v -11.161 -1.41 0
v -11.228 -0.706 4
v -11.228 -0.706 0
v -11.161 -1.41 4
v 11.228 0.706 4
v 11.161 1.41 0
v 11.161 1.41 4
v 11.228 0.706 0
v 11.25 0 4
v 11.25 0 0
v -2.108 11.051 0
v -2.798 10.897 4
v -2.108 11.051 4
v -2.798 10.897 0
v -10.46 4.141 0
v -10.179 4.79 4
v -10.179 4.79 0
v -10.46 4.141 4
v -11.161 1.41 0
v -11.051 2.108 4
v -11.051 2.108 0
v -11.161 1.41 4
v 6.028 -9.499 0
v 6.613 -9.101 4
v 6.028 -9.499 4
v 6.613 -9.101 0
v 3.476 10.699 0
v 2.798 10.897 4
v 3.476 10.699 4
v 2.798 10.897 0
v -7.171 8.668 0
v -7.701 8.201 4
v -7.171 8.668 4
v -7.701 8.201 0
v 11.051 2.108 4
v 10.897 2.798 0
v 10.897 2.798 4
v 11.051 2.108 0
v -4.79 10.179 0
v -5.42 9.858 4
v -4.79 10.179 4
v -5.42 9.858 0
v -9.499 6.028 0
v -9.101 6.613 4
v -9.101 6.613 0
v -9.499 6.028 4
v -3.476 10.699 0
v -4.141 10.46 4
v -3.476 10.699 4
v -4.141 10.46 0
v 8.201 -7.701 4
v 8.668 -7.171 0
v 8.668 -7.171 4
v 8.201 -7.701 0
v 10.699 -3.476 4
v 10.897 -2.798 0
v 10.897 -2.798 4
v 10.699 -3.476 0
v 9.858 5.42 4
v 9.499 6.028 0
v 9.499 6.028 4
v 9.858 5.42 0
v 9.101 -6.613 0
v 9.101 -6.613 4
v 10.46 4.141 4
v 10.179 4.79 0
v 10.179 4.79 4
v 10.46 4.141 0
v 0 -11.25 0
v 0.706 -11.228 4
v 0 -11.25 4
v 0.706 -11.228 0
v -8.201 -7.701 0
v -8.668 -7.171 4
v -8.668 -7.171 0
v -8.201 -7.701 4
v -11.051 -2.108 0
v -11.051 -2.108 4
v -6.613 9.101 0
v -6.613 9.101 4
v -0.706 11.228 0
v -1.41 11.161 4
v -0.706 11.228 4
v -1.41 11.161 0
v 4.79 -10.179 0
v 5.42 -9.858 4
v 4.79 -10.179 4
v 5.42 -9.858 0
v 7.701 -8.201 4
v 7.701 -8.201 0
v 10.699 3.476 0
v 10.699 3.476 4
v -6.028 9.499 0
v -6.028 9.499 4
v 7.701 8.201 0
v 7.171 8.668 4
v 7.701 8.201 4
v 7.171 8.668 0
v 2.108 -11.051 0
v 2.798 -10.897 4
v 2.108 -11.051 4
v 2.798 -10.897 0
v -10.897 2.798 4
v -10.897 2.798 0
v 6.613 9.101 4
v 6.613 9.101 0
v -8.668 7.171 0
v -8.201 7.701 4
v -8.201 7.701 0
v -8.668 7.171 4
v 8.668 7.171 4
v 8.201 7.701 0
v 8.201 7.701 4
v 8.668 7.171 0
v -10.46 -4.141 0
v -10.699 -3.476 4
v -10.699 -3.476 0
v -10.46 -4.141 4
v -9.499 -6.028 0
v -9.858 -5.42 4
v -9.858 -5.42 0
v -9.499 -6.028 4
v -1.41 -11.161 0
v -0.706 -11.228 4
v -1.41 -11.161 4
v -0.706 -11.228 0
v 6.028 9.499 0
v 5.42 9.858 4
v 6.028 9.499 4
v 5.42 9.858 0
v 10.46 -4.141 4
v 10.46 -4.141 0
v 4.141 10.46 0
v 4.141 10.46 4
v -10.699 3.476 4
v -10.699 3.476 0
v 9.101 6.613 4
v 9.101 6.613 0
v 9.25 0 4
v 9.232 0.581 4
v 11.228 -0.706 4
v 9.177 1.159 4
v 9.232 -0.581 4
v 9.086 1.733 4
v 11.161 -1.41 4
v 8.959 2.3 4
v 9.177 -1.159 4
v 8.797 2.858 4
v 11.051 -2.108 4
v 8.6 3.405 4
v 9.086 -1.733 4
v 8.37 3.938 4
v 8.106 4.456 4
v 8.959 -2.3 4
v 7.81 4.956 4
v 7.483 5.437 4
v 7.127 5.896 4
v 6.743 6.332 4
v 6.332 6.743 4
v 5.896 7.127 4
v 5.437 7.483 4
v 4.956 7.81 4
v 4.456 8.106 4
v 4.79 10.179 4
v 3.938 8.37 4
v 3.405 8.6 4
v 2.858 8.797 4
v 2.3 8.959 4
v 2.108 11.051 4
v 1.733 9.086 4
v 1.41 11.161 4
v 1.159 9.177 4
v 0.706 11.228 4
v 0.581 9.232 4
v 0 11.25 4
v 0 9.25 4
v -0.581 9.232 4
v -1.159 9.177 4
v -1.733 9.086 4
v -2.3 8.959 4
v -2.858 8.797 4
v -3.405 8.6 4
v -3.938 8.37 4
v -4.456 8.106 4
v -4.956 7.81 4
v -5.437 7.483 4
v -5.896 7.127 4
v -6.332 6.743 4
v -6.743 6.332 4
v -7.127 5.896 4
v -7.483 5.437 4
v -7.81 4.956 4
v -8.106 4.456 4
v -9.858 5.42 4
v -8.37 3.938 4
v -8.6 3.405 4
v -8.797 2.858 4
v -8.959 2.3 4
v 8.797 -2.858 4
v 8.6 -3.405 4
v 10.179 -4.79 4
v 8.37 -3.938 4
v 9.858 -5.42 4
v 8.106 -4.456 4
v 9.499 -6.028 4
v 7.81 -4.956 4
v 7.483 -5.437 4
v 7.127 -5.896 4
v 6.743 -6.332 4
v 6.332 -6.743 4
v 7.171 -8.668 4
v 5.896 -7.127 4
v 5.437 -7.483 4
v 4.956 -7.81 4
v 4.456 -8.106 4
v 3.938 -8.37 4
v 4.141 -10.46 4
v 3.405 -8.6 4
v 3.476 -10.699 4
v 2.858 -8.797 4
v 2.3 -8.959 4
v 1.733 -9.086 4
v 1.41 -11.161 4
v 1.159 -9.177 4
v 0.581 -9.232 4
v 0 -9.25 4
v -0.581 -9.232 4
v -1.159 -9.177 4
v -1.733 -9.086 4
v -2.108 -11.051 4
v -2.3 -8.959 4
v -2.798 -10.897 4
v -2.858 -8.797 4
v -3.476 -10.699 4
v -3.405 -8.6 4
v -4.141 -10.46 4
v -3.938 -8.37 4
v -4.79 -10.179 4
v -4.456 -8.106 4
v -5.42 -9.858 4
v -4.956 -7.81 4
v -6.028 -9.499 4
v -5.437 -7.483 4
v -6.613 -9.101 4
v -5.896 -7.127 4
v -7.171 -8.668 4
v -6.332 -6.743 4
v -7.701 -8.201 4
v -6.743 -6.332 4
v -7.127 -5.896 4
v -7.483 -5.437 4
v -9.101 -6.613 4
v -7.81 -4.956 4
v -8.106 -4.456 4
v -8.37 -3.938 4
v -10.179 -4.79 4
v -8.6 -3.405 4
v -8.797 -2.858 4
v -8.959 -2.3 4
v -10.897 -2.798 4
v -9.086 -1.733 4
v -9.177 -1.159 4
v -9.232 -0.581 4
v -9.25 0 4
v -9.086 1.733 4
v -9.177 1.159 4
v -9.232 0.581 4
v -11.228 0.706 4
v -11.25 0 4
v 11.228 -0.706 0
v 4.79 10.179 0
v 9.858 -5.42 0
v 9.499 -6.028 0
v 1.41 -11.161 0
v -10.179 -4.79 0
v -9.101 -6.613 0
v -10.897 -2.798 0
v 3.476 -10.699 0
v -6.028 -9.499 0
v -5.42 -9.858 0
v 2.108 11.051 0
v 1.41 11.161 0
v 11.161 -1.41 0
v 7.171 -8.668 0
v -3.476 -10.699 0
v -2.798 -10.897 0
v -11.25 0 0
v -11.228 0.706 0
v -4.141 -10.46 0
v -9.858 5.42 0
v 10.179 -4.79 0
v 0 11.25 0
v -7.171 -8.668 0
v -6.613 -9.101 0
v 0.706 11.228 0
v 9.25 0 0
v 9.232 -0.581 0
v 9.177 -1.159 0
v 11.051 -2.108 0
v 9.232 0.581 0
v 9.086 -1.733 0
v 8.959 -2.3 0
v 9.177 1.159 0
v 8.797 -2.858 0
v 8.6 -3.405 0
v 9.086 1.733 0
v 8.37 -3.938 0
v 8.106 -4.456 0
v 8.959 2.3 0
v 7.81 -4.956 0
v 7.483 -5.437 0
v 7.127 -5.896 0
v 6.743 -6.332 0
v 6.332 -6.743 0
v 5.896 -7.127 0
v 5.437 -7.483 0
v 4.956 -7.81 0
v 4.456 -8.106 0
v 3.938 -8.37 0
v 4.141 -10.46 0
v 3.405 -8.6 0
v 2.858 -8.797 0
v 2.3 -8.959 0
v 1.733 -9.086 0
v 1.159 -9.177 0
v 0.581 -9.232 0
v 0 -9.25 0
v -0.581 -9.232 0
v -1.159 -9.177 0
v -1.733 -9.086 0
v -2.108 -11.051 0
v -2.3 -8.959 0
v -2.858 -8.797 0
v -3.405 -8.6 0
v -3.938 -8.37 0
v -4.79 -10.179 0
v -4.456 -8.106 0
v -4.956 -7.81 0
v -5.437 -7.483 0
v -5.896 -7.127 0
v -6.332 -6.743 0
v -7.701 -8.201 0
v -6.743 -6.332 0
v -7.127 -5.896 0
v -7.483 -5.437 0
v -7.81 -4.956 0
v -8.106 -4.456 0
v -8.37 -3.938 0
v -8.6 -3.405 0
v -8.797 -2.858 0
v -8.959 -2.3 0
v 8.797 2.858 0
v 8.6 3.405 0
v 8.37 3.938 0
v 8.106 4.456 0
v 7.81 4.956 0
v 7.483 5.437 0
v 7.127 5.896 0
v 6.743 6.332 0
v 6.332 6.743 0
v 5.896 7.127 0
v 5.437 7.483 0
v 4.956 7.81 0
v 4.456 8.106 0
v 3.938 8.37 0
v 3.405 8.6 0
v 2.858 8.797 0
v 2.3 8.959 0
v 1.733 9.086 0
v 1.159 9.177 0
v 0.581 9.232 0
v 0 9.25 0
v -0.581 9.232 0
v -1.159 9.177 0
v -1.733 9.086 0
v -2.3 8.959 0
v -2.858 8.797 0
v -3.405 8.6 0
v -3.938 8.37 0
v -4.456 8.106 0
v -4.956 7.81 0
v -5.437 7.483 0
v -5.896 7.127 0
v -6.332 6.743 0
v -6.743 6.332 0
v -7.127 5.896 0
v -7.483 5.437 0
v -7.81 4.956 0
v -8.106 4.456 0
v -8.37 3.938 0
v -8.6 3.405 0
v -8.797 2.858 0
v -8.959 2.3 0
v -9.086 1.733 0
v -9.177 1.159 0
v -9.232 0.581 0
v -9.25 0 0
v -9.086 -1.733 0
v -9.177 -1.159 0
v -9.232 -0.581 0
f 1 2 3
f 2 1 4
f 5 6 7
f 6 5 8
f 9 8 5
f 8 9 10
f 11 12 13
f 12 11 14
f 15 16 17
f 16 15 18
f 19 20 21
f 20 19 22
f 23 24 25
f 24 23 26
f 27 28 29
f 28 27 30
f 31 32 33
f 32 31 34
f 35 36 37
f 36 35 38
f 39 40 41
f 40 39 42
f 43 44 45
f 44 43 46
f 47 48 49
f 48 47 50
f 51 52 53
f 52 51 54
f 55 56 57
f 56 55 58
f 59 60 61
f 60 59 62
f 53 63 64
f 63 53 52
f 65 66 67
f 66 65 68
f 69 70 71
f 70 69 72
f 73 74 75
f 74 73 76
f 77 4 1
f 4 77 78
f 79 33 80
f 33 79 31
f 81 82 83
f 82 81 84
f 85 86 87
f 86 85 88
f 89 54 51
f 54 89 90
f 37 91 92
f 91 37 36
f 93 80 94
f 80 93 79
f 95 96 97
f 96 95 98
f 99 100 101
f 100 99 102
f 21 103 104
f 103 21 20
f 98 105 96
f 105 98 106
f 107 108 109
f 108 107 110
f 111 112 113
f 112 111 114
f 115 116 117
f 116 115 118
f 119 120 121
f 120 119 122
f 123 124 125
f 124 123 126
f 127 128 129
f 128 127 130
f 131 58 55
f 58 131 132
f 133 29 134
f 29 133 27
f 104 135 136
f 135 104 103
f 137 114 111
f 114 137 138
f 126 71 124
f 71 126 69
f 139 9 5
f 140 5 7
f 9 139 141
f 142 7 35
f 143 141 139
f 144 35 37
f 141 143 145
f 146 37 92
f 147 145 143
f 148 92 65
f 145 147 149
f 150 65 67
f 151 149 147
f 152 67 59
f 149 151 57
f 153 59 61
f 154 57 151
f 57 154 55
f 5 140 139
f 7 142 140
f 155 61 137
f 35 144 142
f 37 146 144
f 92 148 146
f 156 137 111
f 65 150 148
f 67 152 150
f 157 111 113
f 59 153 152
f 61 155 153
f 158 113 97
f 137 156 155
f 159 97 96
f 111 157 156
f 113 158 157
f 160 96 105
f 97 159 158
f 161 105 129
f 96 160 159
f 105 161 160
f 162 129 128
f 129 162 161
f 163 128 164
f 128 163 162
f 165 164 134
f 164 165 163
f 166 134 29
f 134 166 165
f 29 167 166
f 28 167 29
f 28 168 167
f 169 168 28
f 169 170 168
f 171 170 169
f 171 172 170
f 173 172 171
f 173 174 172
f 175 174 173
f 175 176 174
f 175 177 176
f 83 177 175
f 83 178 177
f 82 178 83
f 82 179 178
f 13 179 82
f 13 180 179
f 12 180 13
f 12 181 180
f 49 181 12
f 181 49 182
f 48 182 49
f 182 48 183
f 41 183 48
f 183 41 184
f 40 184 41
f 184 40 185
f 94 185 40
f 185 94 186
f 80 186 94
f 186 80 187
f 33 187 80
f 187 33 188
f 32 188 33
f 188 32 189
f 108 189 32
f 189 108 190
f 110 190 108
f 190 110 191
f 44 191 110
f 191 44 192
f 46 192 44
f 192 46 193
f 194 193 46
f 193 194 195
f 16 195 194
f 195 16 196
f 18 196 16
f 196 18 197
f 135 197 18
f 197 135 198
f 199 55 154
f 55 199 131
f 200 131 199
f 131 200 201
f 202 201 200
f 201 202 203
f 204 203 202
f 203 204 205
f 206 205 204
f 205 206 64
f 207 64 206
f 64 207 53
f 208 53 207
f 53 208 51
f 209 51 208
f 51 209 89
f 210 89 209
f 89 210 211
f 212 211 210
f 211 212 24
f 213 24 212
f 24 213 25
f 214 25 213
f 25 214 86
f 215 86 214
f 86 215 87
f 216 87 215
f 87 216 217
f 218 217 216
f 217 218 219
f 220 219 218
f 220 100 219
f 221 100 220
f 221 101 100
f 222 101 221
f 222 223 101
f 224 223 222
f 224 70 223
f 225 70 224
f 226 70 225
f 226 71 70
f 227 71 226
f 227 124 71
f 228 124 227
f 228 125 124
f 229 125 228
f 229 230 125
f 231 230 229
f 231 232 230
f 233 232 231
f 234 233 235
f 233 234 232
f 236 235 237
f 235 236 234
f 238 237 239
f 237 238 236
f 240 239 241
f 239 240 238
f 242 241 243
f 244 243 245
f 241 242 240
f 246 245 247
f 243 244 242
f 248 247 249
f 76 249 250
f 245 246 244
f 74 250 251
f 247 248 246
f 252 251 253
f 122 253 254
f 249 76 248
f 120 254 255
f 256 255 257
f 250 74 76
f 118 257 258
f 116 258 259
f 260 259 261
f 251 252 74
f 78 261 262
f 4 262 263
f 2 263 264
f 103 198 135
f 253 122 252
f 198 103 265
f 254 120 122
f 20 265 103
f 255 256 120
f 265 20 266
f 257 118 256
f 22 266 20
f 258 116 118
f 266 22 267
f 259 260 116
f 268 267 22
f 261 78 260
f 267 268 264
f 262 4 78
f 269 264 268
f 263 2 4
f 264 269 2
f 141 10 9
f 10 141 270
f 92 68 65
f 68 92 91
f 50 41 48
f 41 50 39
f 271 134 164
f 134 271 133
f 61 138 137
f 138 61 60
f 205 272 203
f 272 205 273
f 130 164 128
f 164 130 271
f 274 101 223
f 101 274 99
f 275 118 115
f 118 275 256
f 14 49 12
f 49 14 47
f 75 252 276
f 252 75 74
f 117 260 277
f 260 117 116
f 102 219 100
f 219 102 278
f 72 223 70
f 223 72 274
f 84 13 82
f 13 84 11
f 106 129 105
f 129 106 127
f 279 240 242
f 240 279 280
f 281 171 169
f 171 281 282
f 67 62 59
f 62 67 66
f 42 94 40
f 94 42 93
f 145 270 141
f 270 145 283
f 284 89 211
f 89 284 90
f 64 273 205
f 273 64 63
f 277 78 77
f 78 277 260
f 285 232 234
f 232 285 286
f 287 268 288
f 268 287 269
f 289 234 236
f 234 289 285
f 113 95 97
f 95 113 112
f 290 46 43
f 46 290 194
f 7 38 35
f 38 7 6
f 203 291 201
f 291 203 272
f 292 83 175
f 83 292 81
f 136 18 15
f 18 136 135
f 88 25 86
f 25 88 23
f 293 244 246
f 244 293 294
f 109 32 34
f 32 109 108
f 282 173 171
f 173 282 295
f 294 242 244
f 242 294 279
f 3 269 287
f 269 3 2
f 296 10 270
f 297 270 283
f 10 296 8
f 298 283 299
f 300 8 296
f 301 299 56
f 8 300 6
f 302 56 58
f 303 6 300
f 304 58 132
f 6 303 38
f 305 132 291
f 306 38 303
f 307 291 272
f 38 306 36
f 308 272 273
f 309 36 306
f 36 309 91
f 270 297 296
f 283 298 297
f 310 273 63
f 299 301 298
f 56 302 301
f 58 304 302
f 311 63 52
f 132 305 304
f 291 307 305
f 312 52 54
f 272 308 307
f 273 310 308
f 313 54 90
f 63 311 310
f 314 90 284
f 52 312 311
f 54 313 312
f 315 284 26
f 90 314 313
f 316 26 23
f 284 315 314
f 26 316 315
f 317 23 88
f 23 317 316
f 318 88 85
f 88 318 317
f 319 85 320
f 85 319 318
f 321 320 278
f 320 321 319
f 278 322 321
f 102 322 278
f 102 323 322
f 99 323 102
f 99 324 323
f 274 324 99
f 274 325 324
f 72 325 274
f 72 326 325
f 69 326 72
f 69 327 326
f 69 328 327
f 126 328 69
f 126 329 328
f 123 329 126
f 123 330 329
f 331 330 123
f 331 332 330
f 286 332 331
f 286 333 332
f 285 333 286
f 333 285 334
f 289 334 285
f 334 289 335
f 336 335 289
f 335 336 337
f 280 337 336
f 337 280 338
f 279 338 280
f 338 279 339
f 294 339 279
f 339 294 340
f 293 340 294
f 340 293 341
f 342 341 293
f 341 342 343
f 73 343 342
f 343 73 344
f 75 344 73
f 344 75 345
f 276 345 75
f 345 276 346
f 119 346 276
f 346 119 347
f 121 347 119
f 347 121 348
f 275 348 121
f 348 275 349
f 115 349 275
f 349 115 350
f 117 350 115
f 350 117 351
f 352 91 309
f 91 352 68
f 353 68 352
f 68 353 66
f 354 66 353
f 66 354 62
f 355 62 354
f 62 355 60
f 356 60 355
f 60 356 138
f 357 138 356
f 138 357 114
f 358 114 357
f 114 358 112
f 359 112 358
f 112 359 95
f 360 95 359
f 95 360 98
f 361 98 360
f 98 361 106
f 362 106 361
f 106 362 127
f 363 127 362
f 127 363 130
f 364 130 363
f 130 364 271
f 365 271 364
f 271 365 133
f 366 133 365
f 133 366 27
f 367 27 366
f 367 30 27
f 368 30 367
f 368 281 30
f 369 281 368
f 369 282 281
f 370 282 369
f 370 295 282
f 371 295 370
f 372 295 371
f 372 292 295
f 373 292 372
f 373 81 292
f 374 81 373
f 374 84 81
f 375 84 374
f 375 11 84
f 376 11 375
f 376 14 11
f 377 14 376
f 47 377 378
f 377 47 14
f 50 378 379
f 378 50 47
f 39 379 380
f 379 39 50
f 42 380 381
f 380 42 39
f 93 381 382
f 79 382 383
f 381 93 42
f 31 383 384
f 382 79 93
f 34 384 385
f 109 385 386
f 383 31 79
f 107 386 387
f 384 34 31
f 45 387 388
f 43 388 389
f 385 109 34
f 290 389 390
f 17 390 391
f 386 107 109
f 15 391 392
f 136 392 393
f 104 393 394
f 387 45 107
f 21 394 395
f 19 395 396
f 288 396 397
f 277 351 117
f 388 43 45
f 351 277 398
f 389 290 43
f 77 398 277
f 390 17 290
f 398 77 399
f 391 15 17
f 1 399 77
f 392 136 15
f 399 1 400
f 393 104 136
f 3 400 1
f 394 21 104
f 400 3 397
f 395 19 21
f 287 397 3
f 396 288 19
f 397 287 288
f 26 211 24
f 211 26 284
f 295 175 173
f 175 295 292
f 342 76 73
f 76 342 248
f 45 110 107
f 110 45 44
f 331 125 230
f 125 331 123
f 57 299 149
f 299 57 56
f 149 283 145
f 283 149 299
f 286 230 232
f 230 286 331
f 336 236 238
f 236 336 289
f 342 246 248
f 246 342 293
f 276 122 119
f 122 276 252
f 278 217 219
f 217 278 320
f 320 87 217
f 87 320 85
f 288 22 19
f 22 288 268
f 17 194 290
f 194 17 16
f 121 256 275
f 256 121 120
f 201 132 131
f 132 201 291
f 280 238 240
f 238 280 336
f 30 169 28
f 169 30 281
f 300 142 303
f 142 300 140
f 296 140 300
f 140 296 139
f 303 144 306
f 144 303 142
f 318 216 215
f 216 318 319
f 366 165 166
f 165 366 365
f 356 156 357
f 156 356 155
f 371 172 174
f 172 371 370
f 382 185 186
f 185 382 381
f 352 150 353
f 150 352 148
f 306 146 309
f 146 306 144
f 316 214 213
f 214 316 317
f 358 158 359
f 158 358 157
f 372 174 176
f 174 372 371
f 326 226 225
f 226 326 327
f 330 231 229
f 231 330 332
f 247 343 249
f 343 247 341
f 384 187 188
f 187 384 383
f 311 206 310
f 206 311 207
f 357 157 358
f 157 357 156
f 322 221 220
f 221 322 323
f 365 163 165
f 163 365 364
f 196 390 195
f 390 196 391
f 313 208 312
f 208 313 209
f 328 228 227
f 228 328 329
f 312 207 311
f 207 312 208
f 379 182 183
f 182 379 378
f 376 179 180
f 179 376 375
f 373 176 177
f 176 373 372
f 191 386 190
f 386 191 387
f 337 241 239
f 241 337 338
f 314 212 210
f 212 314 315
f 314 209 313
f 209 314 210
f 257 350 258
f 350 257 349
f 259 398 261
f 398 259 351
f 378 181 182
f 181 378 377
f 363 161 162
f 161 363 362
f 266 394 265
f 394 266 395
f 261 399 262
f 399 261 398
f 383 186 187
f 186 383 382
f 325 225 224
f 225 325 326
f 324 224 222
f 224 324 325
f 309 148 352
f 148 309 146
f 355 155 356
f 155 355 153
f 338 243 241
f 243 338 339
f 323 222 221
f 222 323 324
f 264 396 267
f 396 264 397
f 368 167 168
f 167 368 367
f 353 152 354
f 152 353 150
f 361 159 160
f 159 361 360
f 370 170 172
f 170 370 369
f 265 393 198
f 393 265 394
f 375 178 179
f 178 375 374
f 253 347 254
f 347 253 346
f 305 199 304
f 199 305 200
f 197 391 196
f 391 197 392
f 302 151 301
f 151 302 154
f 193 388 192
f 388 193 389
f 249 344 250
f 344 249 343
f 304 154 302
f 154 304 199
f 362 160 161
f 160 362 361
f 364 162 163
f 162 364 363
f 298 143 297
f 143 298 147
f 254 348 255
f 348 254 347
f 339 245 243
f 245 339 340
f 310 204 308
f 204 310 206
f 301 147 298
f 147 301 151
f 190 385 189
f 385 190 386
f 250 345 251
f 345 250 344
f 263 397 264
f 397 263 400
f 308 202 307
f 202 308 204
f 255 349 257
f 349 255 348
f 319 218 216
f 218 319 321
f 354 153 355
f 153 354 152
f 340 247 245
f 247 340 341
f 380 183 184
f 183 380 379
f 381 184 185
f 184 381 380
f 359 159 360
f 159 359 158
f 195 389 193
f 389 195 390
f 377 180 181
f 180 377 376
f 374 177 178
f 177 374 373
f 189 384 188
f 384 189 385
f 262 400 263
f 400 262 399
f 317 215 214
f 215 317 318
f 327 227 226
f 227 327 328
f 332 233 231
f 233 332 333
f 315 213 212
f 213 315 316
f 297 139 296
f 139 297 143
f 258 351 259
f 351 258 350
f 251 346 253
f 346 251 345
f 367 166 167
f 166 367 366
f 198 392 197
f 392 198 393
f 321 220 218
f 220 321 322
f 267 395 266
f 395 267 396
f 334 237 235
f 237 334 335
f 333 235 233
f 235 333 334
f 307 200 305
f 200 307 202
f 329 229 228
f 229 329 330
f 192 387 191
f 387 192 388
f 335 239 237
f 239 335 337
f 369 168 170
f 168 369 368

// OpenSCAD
// Parameters for the belt
outer_diameter = 22.5;  // Outer diameter of the belt in mm
thickness = 2;        // Thickness of the belt in mm
height = 4;          // Height of the belt in mm

// Derived dimensions
outer_radius = outer_diameter / 2;
inner_radius = outer_radius - thickness;

// Function to generate a smooth belt
module smooth_belt() {
    difference() {
        // Outer cylinder (belt outer shape)
        cylinder(h = height, r = outer_radius, $fn = 100);
        
        // Inner cylinder (cut-out for the inner part of the belt)
        translate([0, 0, -1])  // Slightly down to avoid surface artifacts
        cylinder(h = height + 2, r = inner_radius, $fn = 100);
    }
}

// Generate the belt model
smooth_belt();
